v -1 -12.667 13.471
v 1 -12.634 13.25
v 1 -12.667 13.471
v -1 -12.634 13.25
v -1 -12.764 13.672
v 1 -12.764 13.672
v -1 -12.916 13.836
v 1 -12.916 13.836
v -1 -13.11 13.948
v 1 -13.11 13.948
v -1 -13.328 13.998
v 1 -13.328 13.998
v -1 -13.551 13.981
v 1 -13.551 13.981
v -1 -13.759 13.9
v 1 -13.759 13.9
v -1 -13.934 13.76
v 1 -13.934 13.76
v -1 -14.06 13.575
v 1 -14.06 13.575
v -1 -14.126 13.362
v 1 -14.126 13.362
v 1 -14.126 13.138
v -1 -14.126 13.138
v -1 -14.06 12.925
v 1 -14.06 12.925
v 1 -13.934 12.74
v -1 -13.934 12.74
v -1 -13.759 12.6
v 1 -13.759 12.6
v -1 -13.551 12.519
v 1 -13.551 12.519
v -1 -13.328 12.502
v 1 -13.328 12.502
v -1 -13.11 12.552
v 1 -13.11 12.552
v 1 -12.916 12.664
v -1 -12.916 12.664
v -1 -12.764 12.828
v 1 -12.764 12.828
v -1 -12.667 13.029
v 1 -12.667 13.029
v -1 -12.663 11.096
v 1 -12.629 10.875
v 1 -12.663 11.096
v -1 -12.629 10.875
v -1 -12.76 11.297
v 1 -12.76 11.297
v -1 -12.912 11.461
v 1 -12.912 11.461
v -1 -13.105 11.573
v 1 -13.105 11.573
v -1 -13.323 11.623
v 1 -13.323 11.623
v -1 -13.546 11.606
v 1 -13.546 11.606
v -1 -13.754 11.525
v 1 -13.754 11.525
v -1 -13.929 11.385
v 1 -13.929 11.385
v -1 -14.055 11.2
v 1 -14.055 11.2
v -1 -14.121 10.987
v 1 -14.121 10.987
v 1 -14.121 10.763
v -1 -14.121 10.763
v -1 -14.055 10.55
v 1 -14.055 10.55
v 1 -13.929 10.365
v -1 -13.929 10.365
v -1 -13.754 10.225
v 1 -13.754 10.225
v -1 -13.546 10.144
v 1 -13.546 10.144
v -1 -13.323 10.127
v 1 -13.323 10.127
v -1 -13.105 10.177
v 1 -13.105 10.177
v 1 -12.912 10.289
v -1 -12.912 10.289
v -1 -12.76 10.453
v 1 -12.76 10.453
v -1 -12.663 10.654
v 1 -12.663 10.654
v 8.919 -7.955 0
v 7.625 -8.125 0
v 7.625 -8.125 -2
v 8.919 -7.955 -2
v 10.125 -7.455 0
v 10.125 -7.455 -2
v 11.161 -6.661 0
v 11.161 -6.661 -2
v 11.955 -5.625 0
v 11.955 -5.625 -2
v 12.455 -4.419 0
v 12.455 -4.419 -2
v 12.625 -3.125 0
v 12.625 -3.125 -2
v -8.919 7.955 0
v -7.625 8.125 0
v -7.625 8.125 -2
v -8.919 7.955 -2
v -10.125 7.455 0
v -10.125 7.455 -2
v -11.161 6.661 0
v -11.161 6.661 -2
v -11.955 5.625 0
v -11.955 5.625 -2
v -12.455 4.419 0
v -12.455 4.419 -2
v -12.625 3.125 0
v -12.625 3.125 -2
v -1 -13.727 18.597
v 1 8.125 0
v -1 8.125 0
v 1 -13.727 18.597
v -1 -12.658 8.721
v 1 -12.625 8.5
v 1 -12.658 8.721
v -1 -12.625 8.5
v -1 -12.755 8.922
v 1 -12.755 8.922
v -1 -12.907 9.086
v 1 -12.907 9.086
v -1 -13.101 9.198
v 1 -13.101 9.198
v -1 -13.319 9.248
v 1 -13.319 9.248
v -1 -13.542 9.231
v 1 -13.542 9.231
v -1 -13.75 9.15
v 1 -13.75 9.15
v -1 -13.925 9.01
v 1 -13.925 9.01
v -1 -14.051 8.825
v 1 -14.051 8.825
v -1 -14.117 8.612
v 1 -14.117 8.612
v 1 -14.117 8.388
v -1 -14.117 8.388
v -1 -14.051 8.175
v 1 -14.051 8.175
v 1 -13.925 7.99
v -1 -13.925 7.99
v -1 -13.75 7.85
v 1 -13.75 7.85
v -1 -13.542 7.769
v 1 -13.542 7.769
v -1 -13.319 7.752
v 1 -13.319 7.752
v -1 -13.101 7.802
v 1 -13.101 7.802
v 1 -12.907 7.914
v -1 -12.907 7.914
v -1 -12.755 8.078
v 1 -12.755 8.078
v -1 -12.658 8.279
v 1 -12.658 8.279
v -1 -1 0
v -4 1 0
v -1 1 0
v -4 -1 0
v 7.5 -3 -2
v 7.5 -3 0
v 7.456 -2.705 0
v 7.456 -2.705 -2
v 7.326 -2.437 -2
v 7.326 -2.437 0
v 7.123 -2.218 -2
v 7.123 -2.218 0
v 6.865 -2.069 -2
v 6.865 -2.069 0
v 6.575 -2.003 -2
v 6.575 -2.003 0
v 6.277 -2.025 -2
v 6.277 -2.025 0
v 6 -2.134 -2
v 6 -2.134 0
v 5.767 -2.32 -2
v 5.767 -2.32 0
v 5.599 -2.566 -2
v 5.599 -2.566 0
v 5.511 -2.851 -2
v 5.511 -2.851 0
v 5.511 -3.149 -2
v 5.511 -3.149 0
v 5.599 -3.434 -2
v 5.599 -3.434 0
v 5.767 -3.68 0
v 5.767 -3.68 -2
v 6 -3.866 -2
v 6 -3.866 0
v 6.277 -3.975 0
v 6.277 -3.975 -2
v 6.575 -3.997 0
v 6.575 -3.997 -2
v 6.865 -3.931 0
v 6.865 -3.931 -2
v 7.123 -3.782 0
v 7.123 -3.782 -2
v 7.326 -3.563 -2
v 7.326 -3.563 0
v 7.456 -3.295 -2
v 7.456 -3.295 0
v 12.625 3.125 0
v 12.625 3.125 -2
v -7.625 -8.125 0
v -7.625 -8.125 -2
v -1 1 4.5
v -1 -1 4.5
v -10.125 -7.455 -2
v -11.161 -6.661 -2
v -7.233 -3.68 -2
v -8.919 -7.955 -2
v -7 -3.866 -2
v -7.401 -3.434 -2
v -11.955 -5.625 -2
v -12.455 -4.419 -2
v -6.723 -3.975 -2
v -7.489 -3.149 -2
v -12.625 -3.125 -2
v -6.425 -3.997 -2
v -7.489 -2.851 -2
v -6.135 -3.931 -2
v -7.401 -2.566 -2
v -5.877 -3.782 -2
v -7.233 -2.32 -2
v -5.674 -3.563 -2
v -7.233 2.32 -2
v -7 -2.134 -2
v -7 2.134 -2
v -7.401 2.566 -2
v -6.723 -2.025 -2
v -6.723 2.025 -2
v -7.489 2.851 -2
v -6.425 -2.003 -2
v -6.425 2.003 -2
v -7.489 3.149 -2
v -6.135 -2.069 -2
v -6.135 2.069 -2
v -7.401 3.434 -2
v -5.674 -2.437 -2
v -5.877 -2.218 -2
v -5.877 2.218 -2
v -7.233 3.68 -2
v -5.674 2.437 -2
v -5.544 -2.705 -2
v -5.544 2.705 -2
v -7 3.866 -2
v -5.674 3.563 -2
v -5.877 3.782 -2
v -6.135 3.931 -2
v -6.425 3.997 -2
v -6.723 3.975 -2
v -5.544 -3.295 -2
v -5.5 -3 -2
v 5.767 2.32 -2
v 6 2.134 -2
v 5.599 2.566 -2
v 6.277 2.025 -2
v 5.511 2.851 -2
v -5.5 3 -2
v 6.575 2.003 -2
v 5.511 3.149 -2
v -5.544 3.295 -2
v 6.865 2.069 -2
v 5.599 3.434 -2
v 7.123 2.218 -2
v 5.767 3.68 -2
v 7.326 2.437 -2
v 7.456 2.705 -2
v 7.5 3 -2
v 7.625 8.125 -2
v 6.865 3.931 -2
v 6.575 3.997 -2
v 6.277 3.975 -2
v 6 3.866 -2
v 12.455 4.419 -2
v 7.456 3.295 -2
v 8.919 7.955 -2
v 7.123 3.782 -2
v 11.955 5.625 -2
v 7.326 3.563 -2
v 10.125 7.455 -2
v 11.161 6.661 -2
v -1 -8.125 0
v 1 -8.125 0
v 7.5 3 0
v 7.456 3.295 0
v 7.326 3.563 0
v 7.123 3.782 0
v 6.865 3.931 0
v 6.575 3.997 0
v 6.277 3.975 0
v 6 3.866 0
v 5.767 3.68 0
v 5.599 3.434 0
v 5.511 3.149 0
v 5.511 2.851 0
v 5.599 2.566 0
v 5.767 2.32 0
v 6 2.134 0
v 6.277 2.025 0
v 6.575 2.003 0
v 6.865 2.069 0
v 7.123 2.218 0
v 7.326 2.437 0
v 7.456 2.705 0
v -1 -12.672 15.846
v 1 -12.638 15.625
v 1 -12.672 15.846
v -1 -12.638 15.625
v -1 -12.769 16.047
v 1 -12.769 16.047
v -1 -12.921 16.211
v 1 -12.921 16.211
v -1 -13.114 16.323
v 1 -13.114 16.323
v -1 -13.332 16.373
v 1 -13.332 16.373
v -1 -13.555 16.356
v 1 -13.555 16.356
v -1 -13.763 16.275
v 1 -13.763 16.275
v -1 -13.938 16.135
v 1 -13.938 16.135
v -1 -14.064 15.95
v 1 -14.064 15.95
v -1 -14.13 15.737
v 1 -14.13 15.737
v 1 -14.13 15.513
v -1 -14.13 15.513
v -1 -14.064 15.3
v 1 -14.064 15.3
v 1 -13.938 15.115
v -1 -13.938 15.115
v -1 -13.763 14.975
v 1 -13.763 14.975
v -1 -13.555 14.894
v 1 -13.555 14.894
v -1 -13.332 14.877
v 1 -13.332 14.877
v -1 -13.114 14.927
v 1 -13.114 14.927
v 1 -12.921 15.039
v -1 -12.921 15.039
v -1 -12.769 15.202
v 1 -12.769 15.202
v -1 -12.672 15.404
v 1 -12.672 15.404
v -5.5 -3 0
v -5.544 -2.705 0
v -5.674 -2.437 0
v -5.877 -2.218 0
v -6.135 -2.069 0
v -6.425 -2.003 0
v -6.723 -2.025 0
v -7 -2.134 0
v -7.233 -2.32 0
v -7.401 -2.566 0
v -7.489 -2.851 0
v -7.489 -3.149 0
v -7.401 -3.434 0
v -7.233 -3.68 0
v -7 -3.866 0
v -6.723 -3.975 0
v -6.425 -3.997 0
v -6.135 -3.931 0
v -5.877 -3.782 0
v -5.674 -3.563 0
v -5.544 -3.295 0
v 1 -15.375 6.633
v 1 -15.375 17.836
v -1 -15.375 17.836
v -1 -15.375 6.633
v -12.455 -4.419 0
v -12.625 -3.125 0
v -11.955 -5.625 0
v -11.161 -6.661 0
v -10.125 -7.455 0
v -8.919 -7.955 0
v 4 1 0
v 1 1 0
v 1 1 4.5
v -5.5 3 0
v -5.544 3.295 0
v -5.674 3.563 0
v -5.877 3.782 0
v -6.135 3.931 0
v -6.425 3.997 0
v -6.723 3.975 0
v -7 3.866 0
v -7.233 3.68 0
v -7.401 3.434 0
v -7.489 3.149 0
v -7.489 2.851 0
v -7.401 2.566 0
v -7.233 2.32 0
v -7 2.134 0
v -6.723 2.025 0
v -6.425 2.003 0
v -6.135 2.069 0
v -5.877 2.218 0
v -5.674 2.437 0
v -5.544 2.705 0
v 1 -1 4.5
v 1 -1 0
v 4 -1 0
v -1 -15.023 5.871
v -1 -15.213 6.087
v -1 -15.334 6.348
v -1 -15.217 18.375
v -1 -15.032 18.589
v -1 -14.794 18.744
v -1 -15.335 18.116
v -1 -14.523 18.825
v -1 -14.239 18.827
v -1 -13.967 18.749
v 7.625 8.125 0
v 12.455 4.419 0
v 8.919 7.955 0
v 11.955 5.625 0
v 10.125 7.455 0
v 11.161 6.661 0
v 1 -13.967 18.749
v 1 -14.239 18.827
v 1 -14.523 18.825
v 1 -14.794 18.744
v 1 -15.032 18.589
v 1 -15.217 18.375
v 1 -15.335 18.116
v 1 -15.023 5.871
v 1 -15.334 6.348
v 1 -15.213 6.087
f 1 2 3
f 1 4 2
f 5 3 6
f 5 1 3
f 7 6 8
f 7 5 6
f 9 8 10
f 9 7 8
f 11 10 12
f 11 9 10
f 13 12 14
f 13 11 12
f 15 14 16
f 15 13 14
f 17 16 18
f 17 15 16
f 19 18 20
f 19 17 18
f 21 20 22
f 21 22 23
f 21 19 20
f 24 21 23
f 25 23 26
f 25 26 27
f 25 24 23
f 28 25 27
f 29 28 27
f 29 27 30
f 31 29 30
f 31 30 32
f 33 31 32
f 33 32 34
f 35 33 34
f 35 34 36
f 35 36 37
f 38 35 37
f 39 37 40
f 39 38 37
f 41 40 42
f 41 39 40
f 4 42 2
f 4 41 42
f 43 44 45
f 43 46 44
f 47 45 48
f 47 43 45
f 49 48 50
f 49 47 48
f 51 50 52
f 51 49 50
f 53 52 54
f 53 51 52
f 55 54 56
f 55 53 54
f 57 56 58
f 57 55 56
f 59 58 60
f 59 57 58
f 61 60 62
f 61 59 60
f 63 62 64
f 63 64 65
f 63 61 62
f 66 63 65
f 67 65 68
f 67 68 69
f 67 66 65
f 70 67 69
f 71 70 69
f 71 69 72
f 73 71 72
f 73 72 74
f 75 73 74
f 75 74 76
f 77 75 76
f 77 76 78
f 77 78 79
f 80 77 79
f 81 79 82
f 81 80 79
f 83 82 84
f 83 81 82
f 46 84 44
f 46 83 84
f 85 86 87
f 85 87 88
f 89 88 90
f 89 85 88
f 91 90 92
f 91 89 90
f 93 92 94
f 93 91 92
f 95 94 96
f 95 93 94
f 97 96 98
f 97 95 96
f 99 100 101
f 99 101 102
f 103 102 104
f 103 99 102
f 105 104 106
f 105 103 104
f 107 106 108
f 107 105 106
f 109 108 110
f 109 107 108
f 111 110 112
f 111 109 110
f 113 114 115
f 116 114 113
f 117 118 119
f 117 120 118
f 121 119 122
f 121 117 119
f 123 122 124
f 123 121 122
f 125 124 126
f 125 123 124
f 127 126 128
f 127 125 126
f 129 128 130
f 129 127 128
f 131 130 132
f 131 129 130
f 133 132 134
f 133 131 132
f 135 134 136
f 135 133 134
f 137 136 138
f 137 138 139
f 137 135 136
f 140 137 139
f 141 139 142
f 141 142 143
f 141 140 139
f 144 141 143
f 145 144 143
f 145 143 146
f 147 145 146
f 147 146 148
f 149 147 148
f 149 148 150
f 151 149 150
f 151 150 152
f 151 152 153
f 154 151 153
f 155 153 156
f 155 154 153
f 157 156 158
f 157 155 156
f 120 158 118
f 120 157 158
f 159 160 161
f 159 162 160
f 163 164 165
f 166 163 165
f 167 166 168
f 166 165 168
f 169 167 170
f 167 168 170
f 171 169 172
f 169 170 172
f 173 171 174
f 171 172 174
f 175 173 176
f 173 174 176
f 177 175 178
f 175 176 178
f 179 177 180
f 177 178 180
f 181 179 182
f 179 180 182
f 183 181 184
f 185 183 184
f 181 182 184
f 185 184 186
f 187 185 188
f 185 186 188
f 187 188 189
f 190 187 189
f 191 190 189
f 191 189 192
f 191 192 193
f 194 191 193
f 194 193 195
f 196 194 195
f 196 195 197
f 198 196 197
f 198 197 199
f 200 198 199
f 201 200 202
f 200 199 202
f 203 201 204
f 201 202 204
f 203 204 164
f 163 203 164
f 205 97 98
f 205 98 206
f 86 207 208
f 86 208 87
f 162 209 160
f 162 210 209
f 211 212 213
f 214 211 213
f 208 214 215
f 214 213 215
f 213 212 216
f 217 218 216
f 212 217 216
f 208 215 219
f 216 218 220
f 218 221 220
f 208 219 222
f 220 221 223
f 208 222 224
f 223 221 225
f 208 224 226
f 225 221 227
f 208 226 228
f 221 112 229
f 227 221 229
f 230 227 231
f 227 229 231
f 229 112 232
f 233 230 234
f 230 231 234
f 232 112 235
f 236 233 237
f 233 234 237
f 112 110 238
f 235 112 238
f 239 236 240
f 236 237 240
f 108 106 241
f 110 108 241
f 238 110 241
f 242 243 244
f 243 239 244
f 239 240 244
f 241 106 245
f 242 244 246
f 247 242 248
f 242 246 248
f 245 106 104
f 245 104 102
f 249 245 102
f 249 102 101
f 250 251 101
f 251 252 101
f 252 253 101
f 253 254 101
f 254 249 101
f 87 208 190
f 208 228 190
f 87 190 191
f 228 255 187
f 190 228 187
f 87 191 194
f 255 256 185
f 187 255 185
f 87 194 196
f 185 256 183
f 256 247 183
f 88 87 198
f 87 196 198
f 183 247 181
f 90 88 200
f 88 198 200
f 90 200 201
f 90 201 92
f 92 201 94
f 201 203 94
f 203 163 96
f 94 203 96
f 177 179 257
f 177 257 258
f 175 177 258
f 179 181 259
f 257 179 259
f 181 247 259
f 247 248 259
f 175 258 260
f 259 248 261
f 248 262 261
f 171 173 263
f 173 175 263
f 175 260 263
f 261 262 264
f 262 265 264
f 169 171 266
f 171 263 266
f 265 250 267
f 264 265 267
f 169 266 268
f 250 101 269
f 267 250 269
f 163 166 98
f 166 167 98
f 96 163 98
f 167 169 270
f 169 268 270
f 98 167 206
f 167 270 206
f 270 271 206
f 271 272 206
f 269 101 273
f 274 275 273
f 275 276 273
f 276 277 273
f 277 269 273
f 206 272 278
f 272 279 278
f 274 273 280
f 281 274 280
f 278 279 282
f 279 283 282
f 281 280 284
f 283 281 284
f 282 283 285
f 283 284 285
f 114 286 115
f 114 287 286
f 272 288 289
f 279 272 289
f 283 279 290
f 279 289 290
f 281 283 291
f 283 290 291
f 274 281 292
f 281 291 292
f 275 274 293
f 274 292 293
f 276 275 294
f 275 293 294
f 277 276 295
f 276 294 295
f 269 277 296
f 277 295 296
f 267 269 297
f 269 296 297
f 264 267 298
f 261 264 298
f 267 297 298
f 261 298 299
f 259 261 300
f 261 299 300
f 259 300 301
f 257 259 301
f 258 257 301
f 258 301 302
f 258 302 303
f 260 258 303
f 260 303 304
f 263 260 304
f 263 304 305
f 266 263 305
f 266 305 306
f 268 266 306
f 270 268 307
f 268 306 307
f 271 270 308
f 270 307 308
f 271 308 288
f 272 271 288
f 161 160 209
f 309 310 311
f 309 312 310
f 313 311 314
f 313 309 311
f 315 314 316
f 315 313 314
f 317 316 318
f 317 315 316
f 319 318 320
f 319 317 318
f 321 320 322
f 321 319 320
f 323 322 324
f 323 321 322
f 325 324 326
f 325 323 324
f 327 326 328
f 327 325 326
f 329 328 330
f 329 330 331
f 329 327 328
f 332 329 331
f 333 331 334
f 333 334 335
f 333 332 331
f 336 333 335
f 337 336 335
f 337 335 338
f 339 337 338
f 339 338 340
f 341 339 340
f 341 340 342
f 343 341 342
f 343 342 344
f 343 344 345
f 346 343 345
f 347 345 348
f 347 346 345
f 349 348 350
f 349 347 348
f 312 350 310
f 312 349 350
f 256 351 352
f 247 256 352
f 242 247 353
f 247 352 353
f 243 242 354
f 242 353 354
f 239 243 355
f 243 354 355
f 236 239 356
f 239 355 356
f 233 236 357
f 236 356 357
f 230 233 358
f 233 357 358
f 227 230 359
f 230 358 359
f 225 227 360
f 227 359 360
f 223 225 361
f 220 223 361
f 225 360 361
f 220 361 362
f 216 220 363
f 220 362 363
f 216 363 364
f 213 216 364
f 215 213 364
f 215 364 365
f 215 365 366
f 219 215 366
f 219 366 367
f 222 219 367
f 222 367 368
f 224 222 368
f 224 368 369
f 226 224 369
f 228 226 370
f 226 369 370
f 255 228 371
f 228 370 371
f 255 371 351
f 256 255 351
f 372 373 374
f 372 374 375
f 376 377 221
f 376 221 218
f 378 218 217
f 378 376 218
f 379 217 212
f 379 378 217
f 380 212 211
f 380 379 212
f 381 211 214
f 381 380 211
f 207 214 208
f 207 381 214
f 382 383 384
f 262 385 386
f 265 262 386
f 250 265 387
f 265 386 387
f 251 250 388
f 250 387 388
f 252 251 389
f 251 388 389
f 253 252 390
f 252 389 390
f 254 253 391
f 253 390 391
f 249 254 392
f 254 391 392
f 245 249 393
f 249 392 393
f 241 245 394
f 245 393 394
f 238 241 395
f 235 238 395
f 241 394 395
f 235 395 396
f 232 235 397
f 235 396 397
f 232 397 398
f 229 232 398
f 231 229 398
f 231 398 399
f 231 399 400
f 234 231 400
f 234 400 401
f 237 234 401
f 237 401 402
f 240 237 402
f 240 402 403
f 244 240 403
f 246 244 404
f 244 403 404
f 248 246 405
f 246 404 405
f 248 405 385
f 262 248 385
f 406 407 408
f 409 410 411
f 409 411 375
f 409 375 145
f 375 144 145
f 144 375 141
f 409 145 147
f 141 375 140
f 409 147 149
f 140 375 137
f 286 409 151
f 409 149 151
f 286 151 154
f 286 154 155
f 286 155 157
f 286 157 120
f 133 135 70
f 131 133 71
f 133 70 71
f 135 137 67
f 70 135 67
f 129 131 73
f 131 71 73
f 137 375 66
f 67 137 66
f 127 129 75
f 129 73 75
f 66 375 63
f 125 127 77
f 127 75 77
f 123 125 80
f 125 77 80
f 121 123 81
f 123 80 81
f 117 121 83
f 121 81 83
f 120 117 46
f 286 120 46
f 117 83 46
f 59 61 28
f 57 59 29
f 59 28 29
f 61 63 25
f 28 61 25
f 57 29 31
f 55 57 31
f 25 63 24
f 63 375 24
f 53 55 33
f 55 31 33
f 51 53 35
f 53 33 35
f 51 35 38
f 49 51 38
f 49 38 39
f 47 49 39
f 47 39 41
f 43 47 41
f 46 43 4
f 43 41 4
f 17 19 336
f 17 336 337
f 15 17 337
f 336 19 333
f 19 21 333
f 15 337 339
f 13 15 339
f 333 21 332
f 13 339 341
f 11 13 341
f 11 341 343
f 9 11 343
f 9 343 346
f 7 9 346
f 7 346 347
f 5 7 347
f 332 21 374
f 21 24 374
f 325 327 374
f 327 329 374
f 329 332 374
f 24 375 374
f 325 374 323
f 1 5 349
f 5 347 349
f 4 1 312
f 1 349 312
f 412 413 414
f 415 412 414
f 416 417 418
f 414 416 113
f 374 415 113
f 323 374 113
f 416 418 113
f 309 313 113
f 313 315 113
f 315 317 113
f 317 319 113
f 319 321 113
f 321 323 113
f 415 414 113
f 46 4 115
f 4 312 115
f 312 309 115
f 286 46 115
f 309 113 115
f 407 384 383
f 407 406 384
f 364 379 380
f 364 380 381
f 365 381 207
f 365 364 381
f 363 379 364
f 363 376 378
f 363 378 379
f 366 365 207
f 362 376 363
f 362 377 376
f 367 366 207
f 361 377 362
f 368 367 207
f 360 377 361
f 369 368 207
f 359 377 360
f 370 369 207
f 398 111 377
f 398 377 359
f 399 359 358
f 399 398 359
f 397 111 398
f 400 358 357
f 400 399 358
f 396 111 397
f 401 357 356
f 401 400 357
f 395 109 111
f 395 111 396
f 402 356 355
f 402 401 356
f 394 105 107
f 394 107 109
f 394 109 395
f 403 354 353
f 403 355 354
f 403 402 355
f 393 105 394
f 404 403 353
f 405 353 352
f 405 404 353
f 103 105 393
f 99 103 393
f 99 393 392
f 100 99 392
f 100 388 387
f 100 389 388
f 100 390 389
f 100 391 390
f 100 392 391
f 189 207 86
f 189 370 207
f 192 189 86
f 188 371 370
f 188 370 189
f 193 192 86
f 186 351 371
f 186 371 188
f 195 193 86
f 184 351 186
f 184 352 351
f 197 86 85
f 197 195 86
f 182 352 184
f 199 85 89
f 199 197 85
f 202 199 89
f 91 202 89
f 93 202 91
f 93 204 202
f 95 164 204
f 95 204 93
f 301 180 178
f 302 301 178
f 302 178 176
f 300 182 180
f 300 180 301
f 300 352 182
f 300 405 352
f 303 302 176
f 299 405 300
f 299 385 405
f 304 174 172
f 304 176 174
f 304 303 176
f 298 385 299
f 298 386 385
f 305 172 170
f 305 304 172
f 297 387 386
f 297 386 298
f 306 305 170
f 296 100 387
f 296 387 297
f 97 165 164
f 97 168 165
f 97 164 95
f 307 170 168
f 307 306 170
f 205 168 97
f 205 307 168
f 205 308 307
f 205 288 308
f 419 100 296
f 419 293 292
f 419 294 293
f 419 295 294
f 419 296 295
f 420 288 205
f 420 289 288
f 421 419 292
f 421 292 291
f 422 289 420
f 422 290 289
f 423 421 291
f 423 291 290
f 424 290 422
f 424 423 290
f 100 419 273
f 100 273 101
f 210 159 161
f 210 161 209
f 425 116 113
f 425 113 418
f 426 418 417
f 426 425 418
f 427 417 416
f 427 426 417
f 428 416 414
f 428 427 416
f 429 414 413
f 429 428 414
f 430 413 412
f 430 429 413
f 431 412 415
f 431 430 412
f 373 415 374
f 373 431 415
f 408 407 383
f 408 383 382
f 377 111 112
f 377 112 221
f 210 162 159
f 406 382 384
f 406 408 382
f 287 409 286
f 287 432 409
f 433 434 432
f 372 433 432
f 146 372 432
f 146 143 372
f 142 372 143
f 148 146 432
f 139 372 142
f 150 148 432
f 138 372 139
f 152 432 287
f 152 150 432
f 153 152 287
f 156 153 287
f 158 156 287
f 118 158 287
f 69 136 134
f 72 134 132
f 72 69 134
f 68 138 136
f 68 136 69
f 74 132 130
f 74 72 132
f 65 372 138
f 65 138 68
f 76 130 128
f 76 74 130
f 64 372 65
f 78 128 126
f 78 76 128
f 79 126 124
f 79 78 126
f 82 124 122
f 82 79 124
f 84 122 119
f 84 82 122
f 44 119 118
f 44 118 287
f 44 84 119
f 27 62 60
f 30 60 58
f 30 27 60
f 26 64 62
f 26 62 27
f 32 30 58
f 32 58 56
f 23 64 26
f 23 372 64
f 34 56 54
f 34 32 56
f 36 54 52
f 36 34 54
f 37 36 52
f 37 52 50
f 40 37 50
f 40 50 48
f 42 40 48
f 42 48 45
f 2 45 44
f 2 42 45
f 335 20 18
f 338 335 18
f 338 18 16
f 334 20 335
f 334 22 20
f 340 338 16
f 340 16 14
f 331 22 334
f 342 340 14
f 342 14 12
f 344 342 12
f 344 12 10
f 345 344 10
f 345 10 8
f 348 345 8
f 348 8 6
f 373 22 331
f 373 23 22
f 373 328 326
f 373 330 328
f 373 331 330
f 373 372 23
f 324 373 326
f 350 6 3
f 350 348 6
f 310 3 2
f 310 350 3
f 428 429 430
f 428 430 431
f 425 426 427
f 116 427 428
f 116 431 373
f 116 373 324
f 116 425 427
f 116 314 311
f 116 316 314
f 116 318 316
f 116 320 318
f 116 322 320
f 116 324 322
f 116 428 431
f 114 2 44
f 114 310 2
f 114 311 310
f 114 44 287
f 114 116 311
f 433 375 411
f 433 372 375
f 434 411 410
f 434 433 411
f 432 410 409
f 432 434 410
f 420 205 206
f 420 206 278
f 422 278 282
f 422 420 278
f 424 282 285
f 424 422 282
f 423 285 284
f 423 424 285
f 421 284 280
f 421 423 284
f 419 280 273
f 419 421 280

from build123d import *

# Parameters (mm, degrees)
F0_R     = 1
F0_W     = 2
F0_H     = 2
F0_H_2   = 7.125
F0_W_2   = 3
F1_DEPTH = 2
F2_R     = 0.75
F3_DEPTH = 1
F5_DEPTH = 1


# Not quite as in the source:
# - ends of sketch curves that miss each other by under 0.0002 mm in the source are joined


with BuildPart() as f1:
    # F0 (on Top) → F1 (new body)
    with BuildSketch(Plane.XY):
        with BuildLine():
            Line((6.5, -8.125), (7.625, -8.125))
            ThreePointArc((7.625, -8.125), (11.1605339059, -6.6605339059), (12.625, -3.125))
            Line((12.625, -3.125), (12.625, -3))
            Line((12.625, -3), (12.625, -1))
            Line((12.625, -1), (12.625, 1))
            Line((12.625, 1), (12.625, 3))
            Line((12.625, 3), (12.625, 3.125))
            ThreePointArc((12.625, 3.125), (11.1605339059, 6.6605339059), (7.625, 8.125))
            Line((7.625, 8.125), (6.5, 8.125))
            Line((6.5, 8.125), (1, 8.125))
            Line((1, 8.125), (1, 1))
            Line((1, 1), (4, 1))
            Line((4, 1), (4, -1))
            Line((4, -1), (1, -1))
            Line((1, -1), (1, -8.125))
            Line((1, -8.125), (6.5, -8.125))
        make_face()
        with Locations((6.5, -3)):
            Circle(F0_R, mode=Mode.SUBTRACT)
        with Locations((6.5, 3)):
            Circle(F0_R, mode=Mode.SUBTRACT)
        with BuildLine():
            Line((-6.5, -8.125), (-1, -8.125))
            Line((-1, -8.125), (-1, -1))
            Line((-1, -1), (-4, -1))
            Line((-4, -1), (-4, 1))
            Line((-4, 1), (-1, 1))
            Line((-1, 1), (-1, 8.125))
            Line((-1, 8.125), (-6.5, 8.125))
            Line((-6.5, 8.125), (-7.625, 8.125))
            ThreePointArc((-7.625, 8.125), (-11.1605339059, 6.6605339059), (-12.625, 3.125))
            Line((-12.625, 3.125), (-12.625, 3))
            Line((-12.625, 3), (-12.625, 1))
            Line((-12.625, 1), (-12.625, -1))
            Line((-12.625, -1), (-12.625, -3))
            Line((-12.625, -3), (-12.625, -3.125))
            ThreePointArc((-12.625, -3.125), (-11.1605339059, -6.6605339059), (-7.625, -8.125))
            Line((-7.625, -8.125), (-6.5, -8.125))
        make_face()
        with Locations((-6.5, -3)):
            Circle(F0_R, mode=Mode.SUBTRACT)
        with Locations((-6.5, 3)):
            Circle(F0_R, mode=Mode.SUBTRACT)
        Rectangle(F0_W, F0_H)
        with Locations((0, 4.5625)):
            Rectangle(F0_W, F0_H_2)
        with Locations((0, -4.5625)):
            Rectangle(F0_W, F0_H_2)
        with Locations((2.5, 0)):
            Rectangle(F0_W_2, F0_H)
        with Locations((-2.5, 0)):
            Rectangle(F0_W_2, F0_H)
    extrude(amount=-F1_DEPTH)


with BuildPart() as f3:
    # F2 (on Right) → F3 (new body, symmetric)
    with BuildSketch(Plane.YZ):
        with BuildLine():
            Line((-8.1246402115, 0), (0, 0))
            Line((0, 0), (8.1249158829, 0))
            Line((8.1249158829, 0), (-13.7268813705, 18.5973458472))
            ThreePointArc((-13.7268813705, 18.5973458472), (-14.7944528403, 18.7435835859), (-15.375, 17.8358064575))
            Line((-15.375, 17.8358064575), (-15.375, 6.6325848519))
            ThreePointArc((-15.375, 6.6325848519), (-15.2827771284, 6.2131320116), (-15.0231186295, 5.8710454622))
            Line((-15.0231186295, 5.8710454622), (-8.1246402115, 0))
        make_face()
        with Locations((-13.375, 8.5)):
            Circle(F2_R, mode=Mode.SUBTRACT)
        with Locations((-13.379498098, 10.8749957404)):
            Circle(F2_R, mode=Mode.SUBTRACT)
        with Locations((-13.383996196, 13.2499914809)):
            Circle(F2_R, mode=Mode.SUBTRACT)
        with Locations((-13.388494294, 15.6249872213)):
            Circle(F2_R, mode=Mode.SUBTRACT)
    extrude(amount=F3_DEPTH, both=True)


with BuildPart() as f5:
    # F4 (on Front) → F5 (new body, symmetric)
    with BuildSketch(Plane.XZ):
        Polygon((-4, 0), (-1, 0), (-1, 4.5), align=None)
    extrude(amount=F5_DEPTH, both=True)


with BuildPart() as f5b:
    # F4 (on Front) → F5, piece 2 (new body, symmetric)
    with BuildSketch(Plane.XZ):
        Polygon((1, 4.5), (1, 0), (4, 0), align=None)
    extrude(amount=F5_DEPTH, both=True)


solid = Compound([f1.part, f3.part, f5.part, f5b.part])
